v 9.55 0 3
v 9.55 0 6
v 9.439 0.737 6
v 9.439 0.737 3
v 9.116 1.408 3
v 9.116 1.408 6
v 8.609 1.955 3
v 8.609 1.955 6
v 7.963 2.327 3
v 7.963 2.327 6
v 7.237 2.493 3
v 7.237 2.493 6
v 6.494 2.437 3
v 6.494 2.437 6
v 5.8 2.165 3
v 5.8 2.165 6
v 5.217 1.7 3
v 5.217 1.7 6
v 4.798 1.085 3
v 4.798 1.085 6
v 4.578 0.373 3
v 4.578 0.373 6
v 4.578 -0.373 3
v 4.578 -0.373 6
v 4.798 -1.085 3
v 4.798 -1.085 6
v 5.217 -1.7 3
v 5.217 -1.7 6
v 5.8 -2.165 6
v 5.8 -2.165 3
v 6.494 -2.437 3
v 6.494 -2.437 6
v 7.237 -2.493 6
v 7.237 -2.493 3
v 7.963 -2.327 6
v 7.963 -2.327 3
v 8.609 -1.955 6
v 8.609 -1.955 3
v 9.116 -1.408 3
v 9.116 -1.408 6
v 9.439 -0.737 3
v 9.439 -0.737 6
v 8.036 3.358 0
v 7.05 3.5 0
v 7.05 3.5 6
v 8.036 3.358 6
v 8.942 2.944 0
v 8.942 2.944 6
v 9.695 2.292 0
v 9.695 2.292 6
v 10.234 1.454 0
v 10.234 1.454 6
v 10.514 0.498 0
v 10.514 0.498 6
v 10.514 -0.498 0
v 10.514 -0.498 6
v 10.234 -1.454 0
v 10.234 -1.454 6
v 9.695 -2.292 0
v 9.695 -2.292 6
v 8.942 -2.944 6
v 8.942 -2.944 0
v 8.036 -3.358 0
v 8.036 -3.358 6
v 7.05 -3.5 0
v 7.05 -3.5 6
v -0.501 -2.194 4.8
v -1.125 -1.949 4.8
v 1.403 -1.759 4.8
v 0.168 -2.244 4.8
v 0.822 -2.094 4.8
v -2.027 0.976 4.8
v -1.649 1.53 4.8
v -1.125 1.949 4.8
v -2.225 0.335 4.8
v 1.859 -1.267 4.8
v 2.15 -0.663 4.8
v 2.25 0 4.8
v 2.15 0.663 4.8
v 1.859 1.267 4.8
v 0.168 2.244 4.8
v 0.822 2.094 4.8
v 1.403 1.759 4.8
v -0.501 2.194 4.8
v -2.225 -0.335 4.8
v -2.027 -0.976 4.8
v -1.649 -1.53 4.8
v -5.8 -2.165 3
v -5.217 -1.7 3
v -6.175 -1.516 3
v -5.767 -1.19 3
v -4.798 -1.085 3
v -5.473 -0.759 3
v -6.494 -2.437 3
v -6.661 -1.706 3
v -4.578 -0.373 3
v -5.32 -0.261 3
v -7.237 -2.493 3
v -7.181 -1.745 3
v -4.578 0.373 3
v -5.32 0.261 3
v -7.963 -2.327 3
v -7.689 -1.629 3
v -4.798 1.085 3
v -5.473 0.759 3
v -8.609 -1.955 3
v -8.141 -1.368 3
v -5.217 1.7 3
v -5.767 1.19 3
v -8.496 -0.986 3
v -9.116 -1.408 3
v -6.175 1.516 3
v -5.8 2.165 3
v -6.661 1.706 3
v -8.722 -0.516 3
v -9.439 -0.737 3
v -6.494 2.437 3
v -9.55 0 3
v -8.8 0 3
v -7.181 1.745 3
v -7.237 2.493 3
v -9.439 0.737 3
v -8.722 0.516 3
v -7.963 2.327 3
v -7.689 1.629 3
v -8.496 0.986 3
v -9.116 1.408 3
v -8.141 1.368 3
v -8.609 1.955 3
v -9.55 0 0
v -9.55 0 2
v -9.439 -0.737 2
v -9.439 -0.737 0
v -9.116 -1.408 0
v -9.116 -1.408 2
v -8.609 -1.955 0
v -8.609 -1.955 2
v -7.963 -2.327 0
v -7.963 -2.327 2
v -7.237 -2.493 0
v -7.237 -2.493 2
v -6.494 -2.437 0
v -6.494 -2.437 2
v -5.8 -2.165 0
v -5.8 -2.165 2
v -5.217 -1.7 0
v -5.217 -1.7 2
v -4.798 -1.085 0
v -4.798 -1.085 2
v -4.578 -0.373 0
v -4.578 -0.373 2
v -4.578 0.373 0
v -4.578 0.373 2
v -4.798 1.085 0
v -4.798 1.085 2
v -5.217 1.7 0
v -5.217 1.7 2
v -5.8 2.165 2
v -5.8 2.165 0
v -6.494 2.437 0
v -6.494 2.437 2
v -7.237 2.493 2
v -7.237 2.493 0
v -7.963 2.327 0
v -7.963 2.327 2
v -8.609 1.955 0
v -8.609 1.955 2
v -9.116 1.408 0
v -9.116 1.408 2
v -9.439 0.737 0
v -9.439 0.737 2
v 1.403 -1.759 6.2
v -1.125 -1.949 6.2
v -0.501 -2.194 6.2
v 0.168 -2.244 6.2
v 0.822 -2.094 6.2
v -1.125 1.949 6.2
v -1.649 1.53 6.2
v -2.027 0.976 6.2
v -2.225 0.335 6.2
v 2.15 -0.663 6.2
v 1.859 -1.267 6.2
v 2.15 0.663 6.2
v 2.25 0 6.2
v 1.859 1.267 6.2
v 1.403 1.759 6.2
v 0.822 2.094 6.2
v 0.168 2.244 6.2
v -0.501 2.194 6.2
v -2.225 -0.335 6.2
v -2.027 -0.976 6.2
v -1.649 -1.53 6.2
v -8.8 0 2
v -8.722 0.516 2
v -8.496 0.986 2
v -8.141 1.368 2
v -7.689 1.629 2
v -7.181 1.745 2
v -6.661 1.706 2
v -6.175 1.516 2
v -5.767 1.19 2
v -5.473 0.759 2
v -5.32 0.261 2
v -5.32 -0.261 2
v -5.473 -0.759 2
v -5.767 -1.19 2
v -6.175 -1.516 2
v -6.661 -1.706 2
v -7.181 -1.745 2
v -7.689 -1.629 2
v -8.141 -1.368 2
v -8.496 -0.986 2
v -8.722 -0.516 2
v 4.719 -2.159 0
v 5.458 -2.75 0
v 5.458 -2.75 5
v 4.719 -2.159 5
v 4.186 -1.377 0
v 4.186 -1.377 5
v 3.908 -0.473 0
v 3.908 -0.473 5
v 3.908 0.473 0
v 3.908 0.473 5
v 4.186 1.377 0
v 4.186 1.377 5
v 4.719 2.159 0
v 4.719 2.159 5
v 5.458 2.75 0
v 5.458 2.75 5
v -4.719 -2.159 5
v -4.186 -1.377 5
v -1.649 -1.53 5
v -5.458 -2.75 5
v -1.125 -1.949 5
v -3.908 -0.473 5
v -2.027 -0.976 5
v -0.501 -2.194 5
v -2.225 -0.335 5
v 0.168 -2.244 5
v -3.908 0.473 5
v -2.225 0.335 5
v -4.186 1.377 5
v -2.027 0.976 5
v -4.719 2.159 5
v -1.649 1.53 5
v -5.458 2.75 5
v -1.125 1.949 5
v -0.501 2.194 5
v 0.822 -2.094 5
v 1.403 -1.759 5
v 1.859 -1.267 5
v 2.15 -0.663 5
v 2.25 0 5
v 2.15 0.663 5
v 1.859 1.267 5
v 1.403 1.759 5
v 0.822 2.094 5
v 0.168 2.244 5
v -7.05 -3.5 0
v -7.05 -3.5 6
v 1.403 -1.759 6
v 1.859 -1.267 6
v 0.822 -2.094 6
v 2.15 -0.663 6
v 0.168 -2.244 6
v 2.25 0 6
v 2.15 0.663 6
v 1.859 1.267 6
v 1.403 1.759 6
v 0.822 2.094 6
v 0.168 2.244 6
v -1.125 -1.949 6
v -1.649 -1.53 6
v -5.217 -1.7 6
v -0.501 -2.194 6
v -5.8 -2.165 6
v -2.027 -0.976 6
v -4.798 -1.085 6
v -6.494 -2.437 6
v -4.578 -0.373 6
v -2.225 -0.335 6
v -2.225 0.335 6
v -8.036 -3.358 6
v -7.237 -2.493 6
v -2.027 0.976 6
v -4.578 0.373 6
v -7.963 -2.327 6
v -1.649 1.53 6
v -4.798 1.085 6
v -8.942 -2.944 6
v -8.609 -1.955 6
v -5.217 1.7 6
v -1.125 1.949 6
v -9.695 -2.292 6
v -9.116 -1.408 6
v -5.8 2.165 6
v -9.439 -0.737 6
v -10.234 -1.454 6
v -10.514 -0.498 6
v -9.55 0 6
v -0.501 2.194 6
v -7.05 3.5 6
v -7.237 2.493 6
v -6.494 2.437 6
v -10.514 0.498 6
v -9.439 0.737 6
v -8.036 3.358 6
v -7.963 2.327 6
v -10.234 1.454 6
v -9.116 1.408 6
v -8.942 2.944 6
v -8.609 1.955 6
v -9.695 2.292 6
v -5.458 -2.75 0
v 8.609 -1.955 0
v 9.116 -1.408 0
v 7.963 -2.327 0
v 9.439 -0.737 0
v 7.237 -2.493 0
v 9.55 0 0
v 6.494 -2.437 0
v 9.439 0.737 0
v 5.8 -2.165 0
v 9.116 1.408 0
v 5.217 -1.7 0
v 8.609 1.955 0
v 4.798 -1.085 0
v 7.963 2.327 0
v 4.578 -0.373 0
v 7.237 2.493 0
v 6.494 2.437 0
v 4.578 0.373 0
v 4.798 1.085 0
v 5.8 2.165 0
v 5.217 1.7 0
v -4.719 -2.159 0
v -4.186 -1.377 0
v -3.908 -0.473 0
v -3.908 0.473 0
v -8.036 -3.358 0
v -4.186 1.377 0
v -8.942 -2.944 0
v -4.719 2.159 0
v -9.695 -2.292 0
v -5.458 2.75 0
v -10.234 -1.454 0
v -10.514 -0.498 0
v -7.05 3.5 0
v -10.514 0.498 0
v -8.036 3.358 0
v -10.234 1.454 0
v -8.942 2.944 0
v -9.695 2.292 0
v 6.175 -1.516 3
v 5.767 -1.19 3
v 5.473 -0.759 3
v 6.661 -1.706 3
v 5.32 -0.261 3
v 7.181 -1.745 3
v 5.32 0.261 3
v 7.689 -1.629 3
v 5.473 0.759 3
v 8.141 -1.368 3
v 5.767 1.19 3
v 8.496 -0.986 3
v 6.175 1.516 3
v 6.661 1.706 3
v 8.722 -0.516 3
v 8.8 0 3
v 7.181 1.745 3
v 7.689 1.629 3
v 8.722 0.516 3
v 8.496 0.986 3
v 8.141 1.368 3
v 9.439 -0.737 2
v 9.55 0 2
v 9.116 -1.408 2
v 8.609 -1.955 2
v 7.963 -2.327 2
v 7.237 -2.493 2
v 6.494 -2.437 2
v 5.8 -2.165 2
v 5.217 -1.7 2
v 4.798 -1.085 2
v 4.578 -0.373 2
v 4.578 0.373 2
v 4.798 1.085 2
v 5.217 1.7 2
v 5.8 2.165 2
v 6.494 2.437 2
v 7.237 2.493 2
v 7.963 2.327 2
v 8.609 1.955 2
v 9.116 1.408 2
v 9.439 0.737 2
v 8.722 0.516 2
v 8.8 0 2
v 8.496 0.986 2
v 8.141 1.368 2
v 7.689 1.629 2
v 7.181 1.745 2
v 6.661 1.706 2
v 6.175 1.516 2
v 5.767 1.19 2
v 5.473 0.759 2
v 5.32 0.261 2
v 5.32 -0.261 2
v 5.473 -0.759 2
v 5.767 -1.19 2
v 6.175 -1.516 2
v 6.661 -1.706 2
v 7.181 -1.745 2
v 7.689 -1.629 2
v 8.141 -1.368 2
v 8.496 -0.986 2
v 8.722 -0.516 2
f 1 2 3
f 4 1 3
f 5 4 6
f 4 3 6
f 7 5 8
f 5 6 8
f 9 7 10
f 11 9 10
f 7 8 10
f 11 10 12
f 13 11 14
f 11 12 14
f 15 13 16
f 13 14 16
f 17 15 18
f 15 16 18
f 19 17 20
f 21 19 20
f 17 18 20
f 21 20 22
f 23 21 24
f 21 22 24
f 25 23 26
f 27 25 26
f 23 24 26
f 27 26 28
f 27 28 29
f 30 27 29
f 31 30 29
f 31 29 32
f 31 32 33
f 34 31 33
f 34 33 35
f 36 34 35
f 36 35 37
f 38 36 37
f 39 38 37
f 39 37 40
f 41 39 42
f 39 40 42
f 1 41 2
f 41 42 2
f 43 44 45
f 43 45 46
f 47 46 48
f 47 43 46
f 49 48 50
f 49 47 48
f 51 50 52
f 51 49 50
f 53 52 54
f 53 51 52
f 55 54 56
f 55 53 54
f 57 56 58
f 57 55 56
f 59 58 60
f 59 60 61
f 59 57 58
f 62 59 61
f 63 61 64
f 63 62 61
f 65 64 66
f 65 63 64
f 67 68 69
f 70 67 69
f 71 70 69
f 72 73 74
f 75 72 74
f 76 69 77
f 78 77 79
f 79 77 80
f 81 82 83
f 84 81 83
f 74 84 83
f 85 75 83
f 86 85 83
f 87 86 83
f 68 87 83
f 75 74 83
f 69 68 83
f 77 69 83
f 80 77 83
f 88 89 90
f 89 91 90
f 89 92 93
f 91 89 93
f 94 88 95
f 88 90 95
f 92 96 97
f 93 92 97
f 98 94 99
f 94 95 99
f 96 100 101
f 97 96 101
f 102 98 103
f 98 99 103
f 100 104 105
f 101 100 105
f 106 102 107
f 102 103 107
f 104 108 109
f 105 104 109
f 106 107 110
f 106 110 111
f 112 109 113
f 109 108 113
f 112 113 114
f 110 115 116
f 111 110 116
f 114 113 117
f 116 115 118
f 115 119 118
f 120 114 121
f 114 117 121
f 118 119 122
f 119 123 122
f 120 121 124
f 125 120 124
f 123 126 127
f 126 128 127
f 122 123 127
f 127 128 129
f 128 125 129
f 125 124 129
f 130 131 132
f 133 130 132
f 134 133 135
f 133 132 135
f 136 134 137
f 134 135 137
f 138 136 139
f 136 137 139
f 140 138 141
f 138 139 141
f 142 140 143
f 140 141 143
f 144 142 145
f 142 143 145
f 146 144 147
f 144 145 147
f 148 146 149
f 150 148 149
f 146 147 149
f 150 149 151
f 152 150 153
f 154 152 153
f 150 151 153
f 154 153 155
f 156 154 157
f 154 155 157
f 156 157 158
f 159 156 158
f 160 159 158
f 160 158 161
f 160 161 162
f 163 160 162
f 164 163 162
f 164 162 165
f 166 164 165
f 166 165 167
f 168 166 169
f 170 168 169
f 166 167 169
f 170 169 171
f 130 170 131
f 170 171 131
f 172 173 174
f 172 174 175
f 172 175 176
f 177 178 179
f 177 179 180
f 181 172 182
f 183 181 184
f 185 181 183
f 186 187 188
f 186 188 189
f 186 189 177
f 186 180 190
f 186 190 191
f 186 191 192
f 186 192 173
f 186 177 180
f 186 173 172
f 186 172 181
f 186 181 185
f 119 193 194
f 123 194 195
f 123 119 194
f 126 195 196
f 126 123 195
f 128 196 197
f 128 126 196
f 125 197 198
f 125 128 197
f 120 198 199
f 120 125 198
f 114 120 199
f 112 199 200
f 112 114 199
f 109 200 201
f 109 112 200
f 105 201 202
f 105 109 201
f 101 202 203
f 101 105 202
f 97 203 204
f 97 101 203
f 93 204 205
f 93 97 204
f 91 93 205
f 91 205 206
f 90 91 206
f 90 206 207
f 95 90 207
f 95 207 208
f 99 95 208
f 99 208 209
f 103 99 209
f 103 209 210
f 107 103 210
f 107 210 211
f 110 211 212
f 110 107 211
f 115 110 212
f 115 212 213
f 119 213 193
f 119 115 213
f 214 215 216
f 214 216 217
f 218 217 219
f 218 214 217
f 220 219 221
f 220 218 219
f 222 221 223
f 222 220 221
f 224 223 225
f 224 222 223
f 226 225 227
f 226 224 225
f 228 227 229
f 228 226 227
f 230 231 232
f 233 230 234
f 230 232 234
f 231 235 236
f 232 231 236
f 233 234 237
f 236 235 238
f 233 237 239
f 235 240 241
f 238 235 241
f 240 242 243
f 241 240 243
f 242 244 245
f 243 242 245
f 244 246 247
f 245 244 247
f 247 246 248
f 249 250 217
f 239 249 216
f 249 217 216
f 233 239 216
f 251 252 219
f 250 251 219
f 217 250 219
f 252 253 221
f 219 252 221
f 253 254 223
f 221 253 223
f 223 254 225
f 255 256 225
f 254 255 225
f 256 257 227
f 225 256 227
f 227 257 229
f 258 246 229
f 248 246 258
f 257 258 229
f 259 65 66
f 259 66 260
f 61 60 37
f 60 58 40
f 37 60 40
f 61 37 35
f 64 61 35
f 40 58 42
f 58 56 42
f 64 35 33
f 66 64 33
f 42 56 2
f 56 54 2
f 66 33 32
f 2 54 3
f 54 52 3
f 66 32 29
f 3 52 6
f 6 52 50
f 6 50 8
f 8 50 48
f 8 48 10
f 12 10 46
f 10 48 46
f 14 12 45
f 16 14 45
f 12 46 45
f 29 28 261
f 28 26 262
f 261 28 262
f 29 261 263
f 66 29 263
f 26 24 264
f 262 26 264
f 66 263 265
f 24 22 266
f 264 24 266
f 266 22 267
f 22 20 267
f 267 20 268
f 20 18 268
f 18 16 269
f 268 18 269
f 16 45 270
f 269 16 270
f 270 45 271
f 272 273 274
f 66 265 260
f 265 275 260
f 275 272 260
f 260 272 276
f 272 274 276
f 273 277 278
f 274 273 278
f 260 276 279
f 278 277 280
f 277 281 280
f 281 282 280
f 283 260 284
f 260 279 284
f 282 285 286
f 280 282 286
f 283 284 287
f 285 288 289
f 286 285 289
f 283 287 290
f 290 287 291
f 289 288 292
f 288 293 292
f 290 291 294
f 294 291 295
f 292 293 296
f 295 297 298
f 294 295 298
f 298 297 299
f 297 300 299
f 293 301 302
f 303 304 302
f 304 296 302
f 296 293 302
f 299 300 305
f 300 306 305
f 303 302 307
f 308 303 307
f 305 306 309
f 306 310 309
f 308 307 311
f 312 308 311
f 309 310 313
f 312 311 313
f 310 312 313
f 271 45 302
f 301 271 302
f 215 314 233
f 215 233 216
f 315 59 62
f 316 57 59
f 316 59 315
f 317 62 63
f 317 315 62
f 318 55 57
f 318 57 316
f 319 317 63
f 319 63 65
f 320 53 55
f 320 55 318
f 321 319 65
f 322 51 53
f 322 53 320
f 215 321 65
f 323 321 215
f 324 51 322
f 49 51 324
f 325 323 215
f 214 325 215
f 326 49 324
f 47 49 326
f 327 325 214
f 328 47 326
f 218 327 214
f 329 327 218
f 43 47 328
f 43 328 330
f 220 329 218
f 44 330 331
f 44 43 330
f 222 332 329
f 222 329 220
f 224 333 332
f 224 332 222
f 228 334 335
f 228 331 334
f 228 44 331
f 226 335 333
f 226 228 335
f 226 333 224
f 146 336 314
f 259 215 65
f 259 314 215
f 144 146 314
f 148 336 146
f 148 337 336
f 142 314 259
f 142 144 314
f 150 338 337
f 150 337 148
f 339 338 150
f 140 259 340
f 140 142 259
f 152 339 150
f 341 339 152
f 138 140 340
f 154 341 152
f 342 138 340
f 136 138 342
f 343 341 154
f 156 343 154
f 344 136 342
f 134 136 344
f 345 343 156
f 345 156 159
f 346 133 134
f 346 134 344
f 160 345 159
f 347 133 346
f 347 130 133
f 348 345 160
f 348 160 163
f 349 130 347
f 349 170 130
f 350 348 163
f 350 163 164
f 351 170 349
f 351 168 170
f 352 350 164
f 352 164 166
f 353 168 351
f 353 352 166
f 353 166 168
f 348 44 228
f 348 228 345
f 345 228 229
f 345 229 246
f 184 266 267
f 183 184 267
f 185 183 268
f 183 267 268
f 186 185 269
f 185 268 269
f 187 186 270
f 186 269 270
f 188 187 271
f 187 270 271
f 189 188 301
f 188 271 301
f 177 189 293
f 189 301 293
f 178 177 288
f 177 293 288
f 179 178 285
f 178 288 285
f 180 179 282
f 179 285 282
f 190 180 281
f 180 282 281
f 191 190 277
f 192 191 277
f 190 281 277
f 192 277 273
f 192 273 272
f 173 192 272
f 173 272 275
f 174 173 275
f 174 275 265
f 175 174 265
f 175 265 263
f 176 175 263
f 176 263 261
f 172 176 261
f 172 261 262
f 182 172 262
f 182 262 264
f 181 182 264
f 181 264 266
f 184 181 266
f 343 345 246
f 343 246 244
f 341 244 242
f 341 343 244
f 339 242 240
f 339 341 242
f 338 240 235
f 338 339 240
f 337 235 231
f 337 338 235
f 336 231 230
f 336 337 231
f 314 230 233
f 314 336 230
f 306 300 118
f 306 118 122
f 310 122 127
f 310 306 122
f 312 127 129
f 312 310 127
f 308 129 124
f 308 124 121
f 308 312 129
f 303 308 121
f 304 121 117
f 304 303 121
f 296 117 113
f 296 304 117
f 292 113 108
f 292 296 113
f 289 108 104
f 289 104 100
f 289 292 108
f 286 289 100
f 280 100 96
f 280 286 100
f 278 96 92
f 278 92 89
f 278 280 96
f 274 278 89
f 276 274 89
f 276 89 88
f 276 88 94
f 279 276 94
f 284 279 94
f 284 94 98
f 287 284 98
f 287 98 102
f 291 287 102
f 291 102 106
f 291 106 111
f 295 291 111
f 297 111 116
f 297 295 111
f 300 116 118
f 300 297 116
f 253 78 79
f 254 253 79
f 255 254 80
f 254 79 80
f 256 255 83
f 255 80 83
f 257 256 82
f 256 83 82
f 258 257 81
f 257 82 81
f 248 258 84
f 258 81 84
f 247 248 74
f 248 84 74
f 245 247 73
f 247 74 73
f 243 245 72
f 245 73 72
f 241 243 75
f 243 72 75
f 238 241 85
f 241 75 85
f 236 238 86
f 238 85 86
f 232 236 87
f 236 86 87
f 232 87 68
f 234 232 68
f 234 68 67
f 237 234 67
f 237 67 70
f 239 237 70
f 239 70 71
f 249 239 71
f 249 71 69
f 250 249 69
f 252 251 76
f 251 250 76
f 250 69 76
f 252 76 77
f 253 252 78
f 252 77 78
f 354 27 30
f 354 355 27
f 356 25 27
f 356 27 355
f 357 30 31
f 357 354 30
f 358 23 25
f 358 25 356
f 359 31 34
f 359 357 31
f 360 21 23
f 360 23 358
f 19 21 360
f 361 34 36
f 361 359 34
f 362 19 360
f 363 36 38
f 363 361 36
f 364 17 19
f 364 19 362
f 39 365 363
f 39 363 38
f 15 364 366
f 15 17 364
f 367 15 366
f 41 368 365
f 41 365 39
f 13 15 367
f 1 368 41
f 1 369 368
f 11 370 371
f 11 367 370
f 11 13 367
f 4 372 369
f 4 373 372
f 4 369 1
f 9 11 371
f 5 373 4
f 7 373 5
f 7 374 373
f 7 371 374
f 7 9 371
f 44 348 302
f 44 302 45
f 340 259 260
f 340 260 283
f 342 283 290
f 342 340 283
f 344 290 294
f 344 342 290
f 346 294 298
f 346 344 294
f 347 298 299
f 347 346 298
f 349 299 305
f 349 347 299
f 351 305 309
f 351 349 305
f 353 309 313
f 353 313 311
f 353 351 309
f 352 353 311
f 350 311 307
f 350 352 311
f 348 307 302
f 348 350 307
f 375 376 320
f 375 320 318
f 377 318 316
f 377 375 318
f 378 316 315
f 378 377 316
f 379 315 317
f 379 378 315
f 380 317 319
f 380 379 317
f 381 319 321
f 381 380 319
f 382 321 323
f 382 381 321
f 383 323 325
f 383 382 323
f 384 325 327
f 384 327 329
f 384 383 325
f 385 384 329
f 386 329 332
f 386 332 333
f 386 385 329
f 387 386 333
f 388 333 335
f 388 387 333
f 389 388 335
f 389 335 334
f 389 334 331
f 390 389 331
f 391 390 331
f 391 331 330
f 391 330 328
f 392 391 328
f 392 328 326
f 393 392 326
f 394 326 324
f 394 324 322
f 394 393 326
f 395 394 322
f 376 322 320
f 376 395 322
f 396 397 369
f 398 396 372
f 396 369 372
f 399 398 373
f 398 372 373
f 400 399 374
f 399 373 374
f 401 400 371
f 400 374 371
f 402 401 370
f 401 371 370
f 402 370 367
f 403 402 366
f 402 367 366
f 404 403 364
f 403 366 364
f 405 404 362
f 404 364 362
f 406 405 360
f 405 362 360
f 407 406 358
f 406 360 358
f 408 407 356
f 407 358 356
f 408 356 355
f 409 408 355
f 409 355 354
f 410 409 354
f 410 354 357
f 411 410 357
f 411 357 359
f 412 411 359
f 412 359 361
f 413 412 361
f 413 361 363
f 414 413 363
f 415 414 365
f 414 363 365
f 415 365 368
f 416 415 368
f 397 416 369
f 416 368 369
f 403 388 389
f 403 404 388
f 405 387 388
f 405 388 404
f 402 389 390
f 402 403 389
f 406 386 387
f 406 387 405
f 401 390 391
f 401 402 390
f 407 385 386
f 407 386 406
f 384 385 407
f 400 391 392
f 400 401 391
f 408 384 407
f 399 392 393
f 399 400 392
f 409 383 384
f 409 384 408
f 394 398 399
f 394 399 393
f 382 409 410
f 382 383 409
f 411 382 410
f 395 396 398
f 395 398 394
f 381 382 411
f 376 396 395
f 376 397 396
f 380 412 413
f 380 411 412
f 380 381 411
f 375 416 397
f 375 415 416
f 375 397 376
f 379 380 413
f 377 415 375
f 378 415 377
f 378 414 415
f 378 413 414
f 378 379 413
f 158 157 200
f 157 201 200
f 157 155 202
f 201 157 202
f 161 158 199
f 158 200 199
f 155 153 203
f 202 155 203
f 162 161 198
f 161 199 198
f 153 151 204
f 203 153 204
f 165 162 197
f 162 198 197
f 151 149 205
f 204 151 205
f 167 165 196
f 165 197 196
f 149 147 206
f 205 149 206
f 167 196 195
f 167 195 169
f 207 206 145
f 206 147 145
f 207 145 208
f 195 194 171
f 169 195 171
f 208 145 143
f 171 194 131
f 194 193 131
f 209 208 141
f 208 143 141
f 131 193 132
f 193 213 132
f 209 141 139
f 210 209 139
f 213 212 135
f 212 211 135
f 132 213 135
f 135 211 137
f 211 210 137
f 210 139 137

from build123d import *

# Parameters (mm, degrees)
ESTRUSIONE_ESTRUSIONE1_DEPTH      = 6
SCHIZZO2_R                        = 2.5
TAGLIO_ESTRUSIONE1_DEPTH          = 3
SCHIZZO3_R                        = 1.75
TAGLIO_ESTRUSIONE2_DEPTH          = 12.513144662
TAGLIO_ESTRUSIONE3_START          = -2
SCHIZZO4_R                        = 2.5
SCHIZZO4_R_2                      = 1.75
TAGLIO_ESTRUSIONE3_DEPTH          = 2
TAGLIO_ESTRUSIONE4_DEPTH          = 5
ESTRUSIONE_ESTRUSIONE2_DEPTH      = 0.2
ESTRUSIONE_ESTRUSIONE2_DEPTH_BACK = 1.2
SCHIZZO5_R                        = 2.25


with BuildPart() as part:
    # Schizzo1 → Estrusione-Estrusione1 (new body)
    with BuildSketch(Plane.XY):
        with BuildLine():
            Line((7.05, -3.5), (-7.05, -3.5))
            ThreePointArc((-7.05, -3.5), (-10.55, 0), (-7.05, 3.5))
            Line((-7.05, 3.5), (7.05, 3.5))
            ThreePointArc((7.05, 3.5), (10.55, 0), (7.05, -3.5))
        make_face()
    extrude(amount=ESTRUSIONE_ESTRUSIONE1_DEPTH)

    # Schizzo2 → Taglio-Estrusione1 (cut)
    with BuildSketch(Plane.XY.offset(6)):
        with Locations((7.05, 0)):
            Circle(SCHIZZO2_R)
    taglio_estrusione1 = extrude(amount=-TAGLIO_ESTRUSIONE1_DEPTH, mode=Mode.SUBTRACT)

    # Schizzo3 → Taglio-Estrusione2 (cut, through all)
    with BuildSketch(Plane.XY.offset(3)):
        with Locations((7.05, 0)):
            Circle(SCHIZZO3_R)
    taglio_estrusione2 = extrude(amount=-TAGLIO_ESTRUSIONE2_DEPTH, mode=Mode.SUBTRACT)

    # Schizzo4 → Taglio-Estrusione3 (cut)
    with BuildSketch(Plane(origin=(0, 0, 0), x_dir=(-1, 0, 0), z_dir=(0, 0, -1)).offset(TAGLIO_ESTRUSIONE3_START)):
        with Locations(Location((-7.05, 0, 0), (0, 0, 180))):
            Circle(SCHIZZO4_R)
        with Locations(Location((-7.05, 0, 0), (0, 0, 180))):
            Circle(SCHIZZO4_R_2, mode=Mode.SUBTRACT)
    taglio_estrusione3 = extrude(amount=TAGLIO_ESTRUSIONE3_DEPTH, mode=Mode.SUBTRACT)

    # Specchia1: Taglio-Estrusione1, Taglio-Estrusione2, Taglio-Estrusione3 across plane
    add(taglio_estrusione1.mirror(Plane(origin=(0, 0, 0), x_dir=(0, 0, 1), z_dir=(1, 0, 0))), mode=Mode.SUBTRACT)
    add(taglio_estrusione2.mirror(Plane(origin=(0, 0, 0), x_dir=(0, 0, 1), z_dir=(1, 0, 0))), mode=Mode.SUBTRACT)
    add(taglio_estrusione3.mirror(Plane(origin=(0, 0, 0), x_dir=(0, 0, 1), z_dir=(1, 0, 0))), mode=Mode.SUBTRACT)

    # Schizzo6 → Taglio-Estrusione4 (cut)
    with BuildSketch(Plane(origin=(0, 0, 0), x_dir=(-1, 0, 0), z_dir=(0, 0, -1))):
        with BuildLine():
            Line((-5.457945829, 2.75), (5.457945829, 2.75))
            ThreePointArc((5.457945829, 2.75), (3.87240083, 0), (5.457945829, -2.75))
            Line((5.457945829, -2.75), (-5.457945829, -2.75))
            ThreePointArc((-5.457945829, -2.75), (-3.87240083, 0), (-5.457945829, 2.75))
        make_face()
    extrude(amount=-TAGLIO_ESTRUSIONE4_DEPTH, mode=Mode.SUBTRACT)

    # Schizzo5 → Estrusione-Estrusione2 (add, two sides: drawn at the far end of the back side and taken through both)
    with BuildSketch(Plane.XY.offset(6).offset(-ESTRUSIONE_ESTRUSIONE2_DEPTH_BACK)):
        Circle(SCHIZZO5_R)
    extrude(amount=ESTRUSIONE_ESTRUSIONE2_DEPTH + ESTRUSIONE_ESTRUSIONE2_DEPTH_BACK)


solid = part.part
